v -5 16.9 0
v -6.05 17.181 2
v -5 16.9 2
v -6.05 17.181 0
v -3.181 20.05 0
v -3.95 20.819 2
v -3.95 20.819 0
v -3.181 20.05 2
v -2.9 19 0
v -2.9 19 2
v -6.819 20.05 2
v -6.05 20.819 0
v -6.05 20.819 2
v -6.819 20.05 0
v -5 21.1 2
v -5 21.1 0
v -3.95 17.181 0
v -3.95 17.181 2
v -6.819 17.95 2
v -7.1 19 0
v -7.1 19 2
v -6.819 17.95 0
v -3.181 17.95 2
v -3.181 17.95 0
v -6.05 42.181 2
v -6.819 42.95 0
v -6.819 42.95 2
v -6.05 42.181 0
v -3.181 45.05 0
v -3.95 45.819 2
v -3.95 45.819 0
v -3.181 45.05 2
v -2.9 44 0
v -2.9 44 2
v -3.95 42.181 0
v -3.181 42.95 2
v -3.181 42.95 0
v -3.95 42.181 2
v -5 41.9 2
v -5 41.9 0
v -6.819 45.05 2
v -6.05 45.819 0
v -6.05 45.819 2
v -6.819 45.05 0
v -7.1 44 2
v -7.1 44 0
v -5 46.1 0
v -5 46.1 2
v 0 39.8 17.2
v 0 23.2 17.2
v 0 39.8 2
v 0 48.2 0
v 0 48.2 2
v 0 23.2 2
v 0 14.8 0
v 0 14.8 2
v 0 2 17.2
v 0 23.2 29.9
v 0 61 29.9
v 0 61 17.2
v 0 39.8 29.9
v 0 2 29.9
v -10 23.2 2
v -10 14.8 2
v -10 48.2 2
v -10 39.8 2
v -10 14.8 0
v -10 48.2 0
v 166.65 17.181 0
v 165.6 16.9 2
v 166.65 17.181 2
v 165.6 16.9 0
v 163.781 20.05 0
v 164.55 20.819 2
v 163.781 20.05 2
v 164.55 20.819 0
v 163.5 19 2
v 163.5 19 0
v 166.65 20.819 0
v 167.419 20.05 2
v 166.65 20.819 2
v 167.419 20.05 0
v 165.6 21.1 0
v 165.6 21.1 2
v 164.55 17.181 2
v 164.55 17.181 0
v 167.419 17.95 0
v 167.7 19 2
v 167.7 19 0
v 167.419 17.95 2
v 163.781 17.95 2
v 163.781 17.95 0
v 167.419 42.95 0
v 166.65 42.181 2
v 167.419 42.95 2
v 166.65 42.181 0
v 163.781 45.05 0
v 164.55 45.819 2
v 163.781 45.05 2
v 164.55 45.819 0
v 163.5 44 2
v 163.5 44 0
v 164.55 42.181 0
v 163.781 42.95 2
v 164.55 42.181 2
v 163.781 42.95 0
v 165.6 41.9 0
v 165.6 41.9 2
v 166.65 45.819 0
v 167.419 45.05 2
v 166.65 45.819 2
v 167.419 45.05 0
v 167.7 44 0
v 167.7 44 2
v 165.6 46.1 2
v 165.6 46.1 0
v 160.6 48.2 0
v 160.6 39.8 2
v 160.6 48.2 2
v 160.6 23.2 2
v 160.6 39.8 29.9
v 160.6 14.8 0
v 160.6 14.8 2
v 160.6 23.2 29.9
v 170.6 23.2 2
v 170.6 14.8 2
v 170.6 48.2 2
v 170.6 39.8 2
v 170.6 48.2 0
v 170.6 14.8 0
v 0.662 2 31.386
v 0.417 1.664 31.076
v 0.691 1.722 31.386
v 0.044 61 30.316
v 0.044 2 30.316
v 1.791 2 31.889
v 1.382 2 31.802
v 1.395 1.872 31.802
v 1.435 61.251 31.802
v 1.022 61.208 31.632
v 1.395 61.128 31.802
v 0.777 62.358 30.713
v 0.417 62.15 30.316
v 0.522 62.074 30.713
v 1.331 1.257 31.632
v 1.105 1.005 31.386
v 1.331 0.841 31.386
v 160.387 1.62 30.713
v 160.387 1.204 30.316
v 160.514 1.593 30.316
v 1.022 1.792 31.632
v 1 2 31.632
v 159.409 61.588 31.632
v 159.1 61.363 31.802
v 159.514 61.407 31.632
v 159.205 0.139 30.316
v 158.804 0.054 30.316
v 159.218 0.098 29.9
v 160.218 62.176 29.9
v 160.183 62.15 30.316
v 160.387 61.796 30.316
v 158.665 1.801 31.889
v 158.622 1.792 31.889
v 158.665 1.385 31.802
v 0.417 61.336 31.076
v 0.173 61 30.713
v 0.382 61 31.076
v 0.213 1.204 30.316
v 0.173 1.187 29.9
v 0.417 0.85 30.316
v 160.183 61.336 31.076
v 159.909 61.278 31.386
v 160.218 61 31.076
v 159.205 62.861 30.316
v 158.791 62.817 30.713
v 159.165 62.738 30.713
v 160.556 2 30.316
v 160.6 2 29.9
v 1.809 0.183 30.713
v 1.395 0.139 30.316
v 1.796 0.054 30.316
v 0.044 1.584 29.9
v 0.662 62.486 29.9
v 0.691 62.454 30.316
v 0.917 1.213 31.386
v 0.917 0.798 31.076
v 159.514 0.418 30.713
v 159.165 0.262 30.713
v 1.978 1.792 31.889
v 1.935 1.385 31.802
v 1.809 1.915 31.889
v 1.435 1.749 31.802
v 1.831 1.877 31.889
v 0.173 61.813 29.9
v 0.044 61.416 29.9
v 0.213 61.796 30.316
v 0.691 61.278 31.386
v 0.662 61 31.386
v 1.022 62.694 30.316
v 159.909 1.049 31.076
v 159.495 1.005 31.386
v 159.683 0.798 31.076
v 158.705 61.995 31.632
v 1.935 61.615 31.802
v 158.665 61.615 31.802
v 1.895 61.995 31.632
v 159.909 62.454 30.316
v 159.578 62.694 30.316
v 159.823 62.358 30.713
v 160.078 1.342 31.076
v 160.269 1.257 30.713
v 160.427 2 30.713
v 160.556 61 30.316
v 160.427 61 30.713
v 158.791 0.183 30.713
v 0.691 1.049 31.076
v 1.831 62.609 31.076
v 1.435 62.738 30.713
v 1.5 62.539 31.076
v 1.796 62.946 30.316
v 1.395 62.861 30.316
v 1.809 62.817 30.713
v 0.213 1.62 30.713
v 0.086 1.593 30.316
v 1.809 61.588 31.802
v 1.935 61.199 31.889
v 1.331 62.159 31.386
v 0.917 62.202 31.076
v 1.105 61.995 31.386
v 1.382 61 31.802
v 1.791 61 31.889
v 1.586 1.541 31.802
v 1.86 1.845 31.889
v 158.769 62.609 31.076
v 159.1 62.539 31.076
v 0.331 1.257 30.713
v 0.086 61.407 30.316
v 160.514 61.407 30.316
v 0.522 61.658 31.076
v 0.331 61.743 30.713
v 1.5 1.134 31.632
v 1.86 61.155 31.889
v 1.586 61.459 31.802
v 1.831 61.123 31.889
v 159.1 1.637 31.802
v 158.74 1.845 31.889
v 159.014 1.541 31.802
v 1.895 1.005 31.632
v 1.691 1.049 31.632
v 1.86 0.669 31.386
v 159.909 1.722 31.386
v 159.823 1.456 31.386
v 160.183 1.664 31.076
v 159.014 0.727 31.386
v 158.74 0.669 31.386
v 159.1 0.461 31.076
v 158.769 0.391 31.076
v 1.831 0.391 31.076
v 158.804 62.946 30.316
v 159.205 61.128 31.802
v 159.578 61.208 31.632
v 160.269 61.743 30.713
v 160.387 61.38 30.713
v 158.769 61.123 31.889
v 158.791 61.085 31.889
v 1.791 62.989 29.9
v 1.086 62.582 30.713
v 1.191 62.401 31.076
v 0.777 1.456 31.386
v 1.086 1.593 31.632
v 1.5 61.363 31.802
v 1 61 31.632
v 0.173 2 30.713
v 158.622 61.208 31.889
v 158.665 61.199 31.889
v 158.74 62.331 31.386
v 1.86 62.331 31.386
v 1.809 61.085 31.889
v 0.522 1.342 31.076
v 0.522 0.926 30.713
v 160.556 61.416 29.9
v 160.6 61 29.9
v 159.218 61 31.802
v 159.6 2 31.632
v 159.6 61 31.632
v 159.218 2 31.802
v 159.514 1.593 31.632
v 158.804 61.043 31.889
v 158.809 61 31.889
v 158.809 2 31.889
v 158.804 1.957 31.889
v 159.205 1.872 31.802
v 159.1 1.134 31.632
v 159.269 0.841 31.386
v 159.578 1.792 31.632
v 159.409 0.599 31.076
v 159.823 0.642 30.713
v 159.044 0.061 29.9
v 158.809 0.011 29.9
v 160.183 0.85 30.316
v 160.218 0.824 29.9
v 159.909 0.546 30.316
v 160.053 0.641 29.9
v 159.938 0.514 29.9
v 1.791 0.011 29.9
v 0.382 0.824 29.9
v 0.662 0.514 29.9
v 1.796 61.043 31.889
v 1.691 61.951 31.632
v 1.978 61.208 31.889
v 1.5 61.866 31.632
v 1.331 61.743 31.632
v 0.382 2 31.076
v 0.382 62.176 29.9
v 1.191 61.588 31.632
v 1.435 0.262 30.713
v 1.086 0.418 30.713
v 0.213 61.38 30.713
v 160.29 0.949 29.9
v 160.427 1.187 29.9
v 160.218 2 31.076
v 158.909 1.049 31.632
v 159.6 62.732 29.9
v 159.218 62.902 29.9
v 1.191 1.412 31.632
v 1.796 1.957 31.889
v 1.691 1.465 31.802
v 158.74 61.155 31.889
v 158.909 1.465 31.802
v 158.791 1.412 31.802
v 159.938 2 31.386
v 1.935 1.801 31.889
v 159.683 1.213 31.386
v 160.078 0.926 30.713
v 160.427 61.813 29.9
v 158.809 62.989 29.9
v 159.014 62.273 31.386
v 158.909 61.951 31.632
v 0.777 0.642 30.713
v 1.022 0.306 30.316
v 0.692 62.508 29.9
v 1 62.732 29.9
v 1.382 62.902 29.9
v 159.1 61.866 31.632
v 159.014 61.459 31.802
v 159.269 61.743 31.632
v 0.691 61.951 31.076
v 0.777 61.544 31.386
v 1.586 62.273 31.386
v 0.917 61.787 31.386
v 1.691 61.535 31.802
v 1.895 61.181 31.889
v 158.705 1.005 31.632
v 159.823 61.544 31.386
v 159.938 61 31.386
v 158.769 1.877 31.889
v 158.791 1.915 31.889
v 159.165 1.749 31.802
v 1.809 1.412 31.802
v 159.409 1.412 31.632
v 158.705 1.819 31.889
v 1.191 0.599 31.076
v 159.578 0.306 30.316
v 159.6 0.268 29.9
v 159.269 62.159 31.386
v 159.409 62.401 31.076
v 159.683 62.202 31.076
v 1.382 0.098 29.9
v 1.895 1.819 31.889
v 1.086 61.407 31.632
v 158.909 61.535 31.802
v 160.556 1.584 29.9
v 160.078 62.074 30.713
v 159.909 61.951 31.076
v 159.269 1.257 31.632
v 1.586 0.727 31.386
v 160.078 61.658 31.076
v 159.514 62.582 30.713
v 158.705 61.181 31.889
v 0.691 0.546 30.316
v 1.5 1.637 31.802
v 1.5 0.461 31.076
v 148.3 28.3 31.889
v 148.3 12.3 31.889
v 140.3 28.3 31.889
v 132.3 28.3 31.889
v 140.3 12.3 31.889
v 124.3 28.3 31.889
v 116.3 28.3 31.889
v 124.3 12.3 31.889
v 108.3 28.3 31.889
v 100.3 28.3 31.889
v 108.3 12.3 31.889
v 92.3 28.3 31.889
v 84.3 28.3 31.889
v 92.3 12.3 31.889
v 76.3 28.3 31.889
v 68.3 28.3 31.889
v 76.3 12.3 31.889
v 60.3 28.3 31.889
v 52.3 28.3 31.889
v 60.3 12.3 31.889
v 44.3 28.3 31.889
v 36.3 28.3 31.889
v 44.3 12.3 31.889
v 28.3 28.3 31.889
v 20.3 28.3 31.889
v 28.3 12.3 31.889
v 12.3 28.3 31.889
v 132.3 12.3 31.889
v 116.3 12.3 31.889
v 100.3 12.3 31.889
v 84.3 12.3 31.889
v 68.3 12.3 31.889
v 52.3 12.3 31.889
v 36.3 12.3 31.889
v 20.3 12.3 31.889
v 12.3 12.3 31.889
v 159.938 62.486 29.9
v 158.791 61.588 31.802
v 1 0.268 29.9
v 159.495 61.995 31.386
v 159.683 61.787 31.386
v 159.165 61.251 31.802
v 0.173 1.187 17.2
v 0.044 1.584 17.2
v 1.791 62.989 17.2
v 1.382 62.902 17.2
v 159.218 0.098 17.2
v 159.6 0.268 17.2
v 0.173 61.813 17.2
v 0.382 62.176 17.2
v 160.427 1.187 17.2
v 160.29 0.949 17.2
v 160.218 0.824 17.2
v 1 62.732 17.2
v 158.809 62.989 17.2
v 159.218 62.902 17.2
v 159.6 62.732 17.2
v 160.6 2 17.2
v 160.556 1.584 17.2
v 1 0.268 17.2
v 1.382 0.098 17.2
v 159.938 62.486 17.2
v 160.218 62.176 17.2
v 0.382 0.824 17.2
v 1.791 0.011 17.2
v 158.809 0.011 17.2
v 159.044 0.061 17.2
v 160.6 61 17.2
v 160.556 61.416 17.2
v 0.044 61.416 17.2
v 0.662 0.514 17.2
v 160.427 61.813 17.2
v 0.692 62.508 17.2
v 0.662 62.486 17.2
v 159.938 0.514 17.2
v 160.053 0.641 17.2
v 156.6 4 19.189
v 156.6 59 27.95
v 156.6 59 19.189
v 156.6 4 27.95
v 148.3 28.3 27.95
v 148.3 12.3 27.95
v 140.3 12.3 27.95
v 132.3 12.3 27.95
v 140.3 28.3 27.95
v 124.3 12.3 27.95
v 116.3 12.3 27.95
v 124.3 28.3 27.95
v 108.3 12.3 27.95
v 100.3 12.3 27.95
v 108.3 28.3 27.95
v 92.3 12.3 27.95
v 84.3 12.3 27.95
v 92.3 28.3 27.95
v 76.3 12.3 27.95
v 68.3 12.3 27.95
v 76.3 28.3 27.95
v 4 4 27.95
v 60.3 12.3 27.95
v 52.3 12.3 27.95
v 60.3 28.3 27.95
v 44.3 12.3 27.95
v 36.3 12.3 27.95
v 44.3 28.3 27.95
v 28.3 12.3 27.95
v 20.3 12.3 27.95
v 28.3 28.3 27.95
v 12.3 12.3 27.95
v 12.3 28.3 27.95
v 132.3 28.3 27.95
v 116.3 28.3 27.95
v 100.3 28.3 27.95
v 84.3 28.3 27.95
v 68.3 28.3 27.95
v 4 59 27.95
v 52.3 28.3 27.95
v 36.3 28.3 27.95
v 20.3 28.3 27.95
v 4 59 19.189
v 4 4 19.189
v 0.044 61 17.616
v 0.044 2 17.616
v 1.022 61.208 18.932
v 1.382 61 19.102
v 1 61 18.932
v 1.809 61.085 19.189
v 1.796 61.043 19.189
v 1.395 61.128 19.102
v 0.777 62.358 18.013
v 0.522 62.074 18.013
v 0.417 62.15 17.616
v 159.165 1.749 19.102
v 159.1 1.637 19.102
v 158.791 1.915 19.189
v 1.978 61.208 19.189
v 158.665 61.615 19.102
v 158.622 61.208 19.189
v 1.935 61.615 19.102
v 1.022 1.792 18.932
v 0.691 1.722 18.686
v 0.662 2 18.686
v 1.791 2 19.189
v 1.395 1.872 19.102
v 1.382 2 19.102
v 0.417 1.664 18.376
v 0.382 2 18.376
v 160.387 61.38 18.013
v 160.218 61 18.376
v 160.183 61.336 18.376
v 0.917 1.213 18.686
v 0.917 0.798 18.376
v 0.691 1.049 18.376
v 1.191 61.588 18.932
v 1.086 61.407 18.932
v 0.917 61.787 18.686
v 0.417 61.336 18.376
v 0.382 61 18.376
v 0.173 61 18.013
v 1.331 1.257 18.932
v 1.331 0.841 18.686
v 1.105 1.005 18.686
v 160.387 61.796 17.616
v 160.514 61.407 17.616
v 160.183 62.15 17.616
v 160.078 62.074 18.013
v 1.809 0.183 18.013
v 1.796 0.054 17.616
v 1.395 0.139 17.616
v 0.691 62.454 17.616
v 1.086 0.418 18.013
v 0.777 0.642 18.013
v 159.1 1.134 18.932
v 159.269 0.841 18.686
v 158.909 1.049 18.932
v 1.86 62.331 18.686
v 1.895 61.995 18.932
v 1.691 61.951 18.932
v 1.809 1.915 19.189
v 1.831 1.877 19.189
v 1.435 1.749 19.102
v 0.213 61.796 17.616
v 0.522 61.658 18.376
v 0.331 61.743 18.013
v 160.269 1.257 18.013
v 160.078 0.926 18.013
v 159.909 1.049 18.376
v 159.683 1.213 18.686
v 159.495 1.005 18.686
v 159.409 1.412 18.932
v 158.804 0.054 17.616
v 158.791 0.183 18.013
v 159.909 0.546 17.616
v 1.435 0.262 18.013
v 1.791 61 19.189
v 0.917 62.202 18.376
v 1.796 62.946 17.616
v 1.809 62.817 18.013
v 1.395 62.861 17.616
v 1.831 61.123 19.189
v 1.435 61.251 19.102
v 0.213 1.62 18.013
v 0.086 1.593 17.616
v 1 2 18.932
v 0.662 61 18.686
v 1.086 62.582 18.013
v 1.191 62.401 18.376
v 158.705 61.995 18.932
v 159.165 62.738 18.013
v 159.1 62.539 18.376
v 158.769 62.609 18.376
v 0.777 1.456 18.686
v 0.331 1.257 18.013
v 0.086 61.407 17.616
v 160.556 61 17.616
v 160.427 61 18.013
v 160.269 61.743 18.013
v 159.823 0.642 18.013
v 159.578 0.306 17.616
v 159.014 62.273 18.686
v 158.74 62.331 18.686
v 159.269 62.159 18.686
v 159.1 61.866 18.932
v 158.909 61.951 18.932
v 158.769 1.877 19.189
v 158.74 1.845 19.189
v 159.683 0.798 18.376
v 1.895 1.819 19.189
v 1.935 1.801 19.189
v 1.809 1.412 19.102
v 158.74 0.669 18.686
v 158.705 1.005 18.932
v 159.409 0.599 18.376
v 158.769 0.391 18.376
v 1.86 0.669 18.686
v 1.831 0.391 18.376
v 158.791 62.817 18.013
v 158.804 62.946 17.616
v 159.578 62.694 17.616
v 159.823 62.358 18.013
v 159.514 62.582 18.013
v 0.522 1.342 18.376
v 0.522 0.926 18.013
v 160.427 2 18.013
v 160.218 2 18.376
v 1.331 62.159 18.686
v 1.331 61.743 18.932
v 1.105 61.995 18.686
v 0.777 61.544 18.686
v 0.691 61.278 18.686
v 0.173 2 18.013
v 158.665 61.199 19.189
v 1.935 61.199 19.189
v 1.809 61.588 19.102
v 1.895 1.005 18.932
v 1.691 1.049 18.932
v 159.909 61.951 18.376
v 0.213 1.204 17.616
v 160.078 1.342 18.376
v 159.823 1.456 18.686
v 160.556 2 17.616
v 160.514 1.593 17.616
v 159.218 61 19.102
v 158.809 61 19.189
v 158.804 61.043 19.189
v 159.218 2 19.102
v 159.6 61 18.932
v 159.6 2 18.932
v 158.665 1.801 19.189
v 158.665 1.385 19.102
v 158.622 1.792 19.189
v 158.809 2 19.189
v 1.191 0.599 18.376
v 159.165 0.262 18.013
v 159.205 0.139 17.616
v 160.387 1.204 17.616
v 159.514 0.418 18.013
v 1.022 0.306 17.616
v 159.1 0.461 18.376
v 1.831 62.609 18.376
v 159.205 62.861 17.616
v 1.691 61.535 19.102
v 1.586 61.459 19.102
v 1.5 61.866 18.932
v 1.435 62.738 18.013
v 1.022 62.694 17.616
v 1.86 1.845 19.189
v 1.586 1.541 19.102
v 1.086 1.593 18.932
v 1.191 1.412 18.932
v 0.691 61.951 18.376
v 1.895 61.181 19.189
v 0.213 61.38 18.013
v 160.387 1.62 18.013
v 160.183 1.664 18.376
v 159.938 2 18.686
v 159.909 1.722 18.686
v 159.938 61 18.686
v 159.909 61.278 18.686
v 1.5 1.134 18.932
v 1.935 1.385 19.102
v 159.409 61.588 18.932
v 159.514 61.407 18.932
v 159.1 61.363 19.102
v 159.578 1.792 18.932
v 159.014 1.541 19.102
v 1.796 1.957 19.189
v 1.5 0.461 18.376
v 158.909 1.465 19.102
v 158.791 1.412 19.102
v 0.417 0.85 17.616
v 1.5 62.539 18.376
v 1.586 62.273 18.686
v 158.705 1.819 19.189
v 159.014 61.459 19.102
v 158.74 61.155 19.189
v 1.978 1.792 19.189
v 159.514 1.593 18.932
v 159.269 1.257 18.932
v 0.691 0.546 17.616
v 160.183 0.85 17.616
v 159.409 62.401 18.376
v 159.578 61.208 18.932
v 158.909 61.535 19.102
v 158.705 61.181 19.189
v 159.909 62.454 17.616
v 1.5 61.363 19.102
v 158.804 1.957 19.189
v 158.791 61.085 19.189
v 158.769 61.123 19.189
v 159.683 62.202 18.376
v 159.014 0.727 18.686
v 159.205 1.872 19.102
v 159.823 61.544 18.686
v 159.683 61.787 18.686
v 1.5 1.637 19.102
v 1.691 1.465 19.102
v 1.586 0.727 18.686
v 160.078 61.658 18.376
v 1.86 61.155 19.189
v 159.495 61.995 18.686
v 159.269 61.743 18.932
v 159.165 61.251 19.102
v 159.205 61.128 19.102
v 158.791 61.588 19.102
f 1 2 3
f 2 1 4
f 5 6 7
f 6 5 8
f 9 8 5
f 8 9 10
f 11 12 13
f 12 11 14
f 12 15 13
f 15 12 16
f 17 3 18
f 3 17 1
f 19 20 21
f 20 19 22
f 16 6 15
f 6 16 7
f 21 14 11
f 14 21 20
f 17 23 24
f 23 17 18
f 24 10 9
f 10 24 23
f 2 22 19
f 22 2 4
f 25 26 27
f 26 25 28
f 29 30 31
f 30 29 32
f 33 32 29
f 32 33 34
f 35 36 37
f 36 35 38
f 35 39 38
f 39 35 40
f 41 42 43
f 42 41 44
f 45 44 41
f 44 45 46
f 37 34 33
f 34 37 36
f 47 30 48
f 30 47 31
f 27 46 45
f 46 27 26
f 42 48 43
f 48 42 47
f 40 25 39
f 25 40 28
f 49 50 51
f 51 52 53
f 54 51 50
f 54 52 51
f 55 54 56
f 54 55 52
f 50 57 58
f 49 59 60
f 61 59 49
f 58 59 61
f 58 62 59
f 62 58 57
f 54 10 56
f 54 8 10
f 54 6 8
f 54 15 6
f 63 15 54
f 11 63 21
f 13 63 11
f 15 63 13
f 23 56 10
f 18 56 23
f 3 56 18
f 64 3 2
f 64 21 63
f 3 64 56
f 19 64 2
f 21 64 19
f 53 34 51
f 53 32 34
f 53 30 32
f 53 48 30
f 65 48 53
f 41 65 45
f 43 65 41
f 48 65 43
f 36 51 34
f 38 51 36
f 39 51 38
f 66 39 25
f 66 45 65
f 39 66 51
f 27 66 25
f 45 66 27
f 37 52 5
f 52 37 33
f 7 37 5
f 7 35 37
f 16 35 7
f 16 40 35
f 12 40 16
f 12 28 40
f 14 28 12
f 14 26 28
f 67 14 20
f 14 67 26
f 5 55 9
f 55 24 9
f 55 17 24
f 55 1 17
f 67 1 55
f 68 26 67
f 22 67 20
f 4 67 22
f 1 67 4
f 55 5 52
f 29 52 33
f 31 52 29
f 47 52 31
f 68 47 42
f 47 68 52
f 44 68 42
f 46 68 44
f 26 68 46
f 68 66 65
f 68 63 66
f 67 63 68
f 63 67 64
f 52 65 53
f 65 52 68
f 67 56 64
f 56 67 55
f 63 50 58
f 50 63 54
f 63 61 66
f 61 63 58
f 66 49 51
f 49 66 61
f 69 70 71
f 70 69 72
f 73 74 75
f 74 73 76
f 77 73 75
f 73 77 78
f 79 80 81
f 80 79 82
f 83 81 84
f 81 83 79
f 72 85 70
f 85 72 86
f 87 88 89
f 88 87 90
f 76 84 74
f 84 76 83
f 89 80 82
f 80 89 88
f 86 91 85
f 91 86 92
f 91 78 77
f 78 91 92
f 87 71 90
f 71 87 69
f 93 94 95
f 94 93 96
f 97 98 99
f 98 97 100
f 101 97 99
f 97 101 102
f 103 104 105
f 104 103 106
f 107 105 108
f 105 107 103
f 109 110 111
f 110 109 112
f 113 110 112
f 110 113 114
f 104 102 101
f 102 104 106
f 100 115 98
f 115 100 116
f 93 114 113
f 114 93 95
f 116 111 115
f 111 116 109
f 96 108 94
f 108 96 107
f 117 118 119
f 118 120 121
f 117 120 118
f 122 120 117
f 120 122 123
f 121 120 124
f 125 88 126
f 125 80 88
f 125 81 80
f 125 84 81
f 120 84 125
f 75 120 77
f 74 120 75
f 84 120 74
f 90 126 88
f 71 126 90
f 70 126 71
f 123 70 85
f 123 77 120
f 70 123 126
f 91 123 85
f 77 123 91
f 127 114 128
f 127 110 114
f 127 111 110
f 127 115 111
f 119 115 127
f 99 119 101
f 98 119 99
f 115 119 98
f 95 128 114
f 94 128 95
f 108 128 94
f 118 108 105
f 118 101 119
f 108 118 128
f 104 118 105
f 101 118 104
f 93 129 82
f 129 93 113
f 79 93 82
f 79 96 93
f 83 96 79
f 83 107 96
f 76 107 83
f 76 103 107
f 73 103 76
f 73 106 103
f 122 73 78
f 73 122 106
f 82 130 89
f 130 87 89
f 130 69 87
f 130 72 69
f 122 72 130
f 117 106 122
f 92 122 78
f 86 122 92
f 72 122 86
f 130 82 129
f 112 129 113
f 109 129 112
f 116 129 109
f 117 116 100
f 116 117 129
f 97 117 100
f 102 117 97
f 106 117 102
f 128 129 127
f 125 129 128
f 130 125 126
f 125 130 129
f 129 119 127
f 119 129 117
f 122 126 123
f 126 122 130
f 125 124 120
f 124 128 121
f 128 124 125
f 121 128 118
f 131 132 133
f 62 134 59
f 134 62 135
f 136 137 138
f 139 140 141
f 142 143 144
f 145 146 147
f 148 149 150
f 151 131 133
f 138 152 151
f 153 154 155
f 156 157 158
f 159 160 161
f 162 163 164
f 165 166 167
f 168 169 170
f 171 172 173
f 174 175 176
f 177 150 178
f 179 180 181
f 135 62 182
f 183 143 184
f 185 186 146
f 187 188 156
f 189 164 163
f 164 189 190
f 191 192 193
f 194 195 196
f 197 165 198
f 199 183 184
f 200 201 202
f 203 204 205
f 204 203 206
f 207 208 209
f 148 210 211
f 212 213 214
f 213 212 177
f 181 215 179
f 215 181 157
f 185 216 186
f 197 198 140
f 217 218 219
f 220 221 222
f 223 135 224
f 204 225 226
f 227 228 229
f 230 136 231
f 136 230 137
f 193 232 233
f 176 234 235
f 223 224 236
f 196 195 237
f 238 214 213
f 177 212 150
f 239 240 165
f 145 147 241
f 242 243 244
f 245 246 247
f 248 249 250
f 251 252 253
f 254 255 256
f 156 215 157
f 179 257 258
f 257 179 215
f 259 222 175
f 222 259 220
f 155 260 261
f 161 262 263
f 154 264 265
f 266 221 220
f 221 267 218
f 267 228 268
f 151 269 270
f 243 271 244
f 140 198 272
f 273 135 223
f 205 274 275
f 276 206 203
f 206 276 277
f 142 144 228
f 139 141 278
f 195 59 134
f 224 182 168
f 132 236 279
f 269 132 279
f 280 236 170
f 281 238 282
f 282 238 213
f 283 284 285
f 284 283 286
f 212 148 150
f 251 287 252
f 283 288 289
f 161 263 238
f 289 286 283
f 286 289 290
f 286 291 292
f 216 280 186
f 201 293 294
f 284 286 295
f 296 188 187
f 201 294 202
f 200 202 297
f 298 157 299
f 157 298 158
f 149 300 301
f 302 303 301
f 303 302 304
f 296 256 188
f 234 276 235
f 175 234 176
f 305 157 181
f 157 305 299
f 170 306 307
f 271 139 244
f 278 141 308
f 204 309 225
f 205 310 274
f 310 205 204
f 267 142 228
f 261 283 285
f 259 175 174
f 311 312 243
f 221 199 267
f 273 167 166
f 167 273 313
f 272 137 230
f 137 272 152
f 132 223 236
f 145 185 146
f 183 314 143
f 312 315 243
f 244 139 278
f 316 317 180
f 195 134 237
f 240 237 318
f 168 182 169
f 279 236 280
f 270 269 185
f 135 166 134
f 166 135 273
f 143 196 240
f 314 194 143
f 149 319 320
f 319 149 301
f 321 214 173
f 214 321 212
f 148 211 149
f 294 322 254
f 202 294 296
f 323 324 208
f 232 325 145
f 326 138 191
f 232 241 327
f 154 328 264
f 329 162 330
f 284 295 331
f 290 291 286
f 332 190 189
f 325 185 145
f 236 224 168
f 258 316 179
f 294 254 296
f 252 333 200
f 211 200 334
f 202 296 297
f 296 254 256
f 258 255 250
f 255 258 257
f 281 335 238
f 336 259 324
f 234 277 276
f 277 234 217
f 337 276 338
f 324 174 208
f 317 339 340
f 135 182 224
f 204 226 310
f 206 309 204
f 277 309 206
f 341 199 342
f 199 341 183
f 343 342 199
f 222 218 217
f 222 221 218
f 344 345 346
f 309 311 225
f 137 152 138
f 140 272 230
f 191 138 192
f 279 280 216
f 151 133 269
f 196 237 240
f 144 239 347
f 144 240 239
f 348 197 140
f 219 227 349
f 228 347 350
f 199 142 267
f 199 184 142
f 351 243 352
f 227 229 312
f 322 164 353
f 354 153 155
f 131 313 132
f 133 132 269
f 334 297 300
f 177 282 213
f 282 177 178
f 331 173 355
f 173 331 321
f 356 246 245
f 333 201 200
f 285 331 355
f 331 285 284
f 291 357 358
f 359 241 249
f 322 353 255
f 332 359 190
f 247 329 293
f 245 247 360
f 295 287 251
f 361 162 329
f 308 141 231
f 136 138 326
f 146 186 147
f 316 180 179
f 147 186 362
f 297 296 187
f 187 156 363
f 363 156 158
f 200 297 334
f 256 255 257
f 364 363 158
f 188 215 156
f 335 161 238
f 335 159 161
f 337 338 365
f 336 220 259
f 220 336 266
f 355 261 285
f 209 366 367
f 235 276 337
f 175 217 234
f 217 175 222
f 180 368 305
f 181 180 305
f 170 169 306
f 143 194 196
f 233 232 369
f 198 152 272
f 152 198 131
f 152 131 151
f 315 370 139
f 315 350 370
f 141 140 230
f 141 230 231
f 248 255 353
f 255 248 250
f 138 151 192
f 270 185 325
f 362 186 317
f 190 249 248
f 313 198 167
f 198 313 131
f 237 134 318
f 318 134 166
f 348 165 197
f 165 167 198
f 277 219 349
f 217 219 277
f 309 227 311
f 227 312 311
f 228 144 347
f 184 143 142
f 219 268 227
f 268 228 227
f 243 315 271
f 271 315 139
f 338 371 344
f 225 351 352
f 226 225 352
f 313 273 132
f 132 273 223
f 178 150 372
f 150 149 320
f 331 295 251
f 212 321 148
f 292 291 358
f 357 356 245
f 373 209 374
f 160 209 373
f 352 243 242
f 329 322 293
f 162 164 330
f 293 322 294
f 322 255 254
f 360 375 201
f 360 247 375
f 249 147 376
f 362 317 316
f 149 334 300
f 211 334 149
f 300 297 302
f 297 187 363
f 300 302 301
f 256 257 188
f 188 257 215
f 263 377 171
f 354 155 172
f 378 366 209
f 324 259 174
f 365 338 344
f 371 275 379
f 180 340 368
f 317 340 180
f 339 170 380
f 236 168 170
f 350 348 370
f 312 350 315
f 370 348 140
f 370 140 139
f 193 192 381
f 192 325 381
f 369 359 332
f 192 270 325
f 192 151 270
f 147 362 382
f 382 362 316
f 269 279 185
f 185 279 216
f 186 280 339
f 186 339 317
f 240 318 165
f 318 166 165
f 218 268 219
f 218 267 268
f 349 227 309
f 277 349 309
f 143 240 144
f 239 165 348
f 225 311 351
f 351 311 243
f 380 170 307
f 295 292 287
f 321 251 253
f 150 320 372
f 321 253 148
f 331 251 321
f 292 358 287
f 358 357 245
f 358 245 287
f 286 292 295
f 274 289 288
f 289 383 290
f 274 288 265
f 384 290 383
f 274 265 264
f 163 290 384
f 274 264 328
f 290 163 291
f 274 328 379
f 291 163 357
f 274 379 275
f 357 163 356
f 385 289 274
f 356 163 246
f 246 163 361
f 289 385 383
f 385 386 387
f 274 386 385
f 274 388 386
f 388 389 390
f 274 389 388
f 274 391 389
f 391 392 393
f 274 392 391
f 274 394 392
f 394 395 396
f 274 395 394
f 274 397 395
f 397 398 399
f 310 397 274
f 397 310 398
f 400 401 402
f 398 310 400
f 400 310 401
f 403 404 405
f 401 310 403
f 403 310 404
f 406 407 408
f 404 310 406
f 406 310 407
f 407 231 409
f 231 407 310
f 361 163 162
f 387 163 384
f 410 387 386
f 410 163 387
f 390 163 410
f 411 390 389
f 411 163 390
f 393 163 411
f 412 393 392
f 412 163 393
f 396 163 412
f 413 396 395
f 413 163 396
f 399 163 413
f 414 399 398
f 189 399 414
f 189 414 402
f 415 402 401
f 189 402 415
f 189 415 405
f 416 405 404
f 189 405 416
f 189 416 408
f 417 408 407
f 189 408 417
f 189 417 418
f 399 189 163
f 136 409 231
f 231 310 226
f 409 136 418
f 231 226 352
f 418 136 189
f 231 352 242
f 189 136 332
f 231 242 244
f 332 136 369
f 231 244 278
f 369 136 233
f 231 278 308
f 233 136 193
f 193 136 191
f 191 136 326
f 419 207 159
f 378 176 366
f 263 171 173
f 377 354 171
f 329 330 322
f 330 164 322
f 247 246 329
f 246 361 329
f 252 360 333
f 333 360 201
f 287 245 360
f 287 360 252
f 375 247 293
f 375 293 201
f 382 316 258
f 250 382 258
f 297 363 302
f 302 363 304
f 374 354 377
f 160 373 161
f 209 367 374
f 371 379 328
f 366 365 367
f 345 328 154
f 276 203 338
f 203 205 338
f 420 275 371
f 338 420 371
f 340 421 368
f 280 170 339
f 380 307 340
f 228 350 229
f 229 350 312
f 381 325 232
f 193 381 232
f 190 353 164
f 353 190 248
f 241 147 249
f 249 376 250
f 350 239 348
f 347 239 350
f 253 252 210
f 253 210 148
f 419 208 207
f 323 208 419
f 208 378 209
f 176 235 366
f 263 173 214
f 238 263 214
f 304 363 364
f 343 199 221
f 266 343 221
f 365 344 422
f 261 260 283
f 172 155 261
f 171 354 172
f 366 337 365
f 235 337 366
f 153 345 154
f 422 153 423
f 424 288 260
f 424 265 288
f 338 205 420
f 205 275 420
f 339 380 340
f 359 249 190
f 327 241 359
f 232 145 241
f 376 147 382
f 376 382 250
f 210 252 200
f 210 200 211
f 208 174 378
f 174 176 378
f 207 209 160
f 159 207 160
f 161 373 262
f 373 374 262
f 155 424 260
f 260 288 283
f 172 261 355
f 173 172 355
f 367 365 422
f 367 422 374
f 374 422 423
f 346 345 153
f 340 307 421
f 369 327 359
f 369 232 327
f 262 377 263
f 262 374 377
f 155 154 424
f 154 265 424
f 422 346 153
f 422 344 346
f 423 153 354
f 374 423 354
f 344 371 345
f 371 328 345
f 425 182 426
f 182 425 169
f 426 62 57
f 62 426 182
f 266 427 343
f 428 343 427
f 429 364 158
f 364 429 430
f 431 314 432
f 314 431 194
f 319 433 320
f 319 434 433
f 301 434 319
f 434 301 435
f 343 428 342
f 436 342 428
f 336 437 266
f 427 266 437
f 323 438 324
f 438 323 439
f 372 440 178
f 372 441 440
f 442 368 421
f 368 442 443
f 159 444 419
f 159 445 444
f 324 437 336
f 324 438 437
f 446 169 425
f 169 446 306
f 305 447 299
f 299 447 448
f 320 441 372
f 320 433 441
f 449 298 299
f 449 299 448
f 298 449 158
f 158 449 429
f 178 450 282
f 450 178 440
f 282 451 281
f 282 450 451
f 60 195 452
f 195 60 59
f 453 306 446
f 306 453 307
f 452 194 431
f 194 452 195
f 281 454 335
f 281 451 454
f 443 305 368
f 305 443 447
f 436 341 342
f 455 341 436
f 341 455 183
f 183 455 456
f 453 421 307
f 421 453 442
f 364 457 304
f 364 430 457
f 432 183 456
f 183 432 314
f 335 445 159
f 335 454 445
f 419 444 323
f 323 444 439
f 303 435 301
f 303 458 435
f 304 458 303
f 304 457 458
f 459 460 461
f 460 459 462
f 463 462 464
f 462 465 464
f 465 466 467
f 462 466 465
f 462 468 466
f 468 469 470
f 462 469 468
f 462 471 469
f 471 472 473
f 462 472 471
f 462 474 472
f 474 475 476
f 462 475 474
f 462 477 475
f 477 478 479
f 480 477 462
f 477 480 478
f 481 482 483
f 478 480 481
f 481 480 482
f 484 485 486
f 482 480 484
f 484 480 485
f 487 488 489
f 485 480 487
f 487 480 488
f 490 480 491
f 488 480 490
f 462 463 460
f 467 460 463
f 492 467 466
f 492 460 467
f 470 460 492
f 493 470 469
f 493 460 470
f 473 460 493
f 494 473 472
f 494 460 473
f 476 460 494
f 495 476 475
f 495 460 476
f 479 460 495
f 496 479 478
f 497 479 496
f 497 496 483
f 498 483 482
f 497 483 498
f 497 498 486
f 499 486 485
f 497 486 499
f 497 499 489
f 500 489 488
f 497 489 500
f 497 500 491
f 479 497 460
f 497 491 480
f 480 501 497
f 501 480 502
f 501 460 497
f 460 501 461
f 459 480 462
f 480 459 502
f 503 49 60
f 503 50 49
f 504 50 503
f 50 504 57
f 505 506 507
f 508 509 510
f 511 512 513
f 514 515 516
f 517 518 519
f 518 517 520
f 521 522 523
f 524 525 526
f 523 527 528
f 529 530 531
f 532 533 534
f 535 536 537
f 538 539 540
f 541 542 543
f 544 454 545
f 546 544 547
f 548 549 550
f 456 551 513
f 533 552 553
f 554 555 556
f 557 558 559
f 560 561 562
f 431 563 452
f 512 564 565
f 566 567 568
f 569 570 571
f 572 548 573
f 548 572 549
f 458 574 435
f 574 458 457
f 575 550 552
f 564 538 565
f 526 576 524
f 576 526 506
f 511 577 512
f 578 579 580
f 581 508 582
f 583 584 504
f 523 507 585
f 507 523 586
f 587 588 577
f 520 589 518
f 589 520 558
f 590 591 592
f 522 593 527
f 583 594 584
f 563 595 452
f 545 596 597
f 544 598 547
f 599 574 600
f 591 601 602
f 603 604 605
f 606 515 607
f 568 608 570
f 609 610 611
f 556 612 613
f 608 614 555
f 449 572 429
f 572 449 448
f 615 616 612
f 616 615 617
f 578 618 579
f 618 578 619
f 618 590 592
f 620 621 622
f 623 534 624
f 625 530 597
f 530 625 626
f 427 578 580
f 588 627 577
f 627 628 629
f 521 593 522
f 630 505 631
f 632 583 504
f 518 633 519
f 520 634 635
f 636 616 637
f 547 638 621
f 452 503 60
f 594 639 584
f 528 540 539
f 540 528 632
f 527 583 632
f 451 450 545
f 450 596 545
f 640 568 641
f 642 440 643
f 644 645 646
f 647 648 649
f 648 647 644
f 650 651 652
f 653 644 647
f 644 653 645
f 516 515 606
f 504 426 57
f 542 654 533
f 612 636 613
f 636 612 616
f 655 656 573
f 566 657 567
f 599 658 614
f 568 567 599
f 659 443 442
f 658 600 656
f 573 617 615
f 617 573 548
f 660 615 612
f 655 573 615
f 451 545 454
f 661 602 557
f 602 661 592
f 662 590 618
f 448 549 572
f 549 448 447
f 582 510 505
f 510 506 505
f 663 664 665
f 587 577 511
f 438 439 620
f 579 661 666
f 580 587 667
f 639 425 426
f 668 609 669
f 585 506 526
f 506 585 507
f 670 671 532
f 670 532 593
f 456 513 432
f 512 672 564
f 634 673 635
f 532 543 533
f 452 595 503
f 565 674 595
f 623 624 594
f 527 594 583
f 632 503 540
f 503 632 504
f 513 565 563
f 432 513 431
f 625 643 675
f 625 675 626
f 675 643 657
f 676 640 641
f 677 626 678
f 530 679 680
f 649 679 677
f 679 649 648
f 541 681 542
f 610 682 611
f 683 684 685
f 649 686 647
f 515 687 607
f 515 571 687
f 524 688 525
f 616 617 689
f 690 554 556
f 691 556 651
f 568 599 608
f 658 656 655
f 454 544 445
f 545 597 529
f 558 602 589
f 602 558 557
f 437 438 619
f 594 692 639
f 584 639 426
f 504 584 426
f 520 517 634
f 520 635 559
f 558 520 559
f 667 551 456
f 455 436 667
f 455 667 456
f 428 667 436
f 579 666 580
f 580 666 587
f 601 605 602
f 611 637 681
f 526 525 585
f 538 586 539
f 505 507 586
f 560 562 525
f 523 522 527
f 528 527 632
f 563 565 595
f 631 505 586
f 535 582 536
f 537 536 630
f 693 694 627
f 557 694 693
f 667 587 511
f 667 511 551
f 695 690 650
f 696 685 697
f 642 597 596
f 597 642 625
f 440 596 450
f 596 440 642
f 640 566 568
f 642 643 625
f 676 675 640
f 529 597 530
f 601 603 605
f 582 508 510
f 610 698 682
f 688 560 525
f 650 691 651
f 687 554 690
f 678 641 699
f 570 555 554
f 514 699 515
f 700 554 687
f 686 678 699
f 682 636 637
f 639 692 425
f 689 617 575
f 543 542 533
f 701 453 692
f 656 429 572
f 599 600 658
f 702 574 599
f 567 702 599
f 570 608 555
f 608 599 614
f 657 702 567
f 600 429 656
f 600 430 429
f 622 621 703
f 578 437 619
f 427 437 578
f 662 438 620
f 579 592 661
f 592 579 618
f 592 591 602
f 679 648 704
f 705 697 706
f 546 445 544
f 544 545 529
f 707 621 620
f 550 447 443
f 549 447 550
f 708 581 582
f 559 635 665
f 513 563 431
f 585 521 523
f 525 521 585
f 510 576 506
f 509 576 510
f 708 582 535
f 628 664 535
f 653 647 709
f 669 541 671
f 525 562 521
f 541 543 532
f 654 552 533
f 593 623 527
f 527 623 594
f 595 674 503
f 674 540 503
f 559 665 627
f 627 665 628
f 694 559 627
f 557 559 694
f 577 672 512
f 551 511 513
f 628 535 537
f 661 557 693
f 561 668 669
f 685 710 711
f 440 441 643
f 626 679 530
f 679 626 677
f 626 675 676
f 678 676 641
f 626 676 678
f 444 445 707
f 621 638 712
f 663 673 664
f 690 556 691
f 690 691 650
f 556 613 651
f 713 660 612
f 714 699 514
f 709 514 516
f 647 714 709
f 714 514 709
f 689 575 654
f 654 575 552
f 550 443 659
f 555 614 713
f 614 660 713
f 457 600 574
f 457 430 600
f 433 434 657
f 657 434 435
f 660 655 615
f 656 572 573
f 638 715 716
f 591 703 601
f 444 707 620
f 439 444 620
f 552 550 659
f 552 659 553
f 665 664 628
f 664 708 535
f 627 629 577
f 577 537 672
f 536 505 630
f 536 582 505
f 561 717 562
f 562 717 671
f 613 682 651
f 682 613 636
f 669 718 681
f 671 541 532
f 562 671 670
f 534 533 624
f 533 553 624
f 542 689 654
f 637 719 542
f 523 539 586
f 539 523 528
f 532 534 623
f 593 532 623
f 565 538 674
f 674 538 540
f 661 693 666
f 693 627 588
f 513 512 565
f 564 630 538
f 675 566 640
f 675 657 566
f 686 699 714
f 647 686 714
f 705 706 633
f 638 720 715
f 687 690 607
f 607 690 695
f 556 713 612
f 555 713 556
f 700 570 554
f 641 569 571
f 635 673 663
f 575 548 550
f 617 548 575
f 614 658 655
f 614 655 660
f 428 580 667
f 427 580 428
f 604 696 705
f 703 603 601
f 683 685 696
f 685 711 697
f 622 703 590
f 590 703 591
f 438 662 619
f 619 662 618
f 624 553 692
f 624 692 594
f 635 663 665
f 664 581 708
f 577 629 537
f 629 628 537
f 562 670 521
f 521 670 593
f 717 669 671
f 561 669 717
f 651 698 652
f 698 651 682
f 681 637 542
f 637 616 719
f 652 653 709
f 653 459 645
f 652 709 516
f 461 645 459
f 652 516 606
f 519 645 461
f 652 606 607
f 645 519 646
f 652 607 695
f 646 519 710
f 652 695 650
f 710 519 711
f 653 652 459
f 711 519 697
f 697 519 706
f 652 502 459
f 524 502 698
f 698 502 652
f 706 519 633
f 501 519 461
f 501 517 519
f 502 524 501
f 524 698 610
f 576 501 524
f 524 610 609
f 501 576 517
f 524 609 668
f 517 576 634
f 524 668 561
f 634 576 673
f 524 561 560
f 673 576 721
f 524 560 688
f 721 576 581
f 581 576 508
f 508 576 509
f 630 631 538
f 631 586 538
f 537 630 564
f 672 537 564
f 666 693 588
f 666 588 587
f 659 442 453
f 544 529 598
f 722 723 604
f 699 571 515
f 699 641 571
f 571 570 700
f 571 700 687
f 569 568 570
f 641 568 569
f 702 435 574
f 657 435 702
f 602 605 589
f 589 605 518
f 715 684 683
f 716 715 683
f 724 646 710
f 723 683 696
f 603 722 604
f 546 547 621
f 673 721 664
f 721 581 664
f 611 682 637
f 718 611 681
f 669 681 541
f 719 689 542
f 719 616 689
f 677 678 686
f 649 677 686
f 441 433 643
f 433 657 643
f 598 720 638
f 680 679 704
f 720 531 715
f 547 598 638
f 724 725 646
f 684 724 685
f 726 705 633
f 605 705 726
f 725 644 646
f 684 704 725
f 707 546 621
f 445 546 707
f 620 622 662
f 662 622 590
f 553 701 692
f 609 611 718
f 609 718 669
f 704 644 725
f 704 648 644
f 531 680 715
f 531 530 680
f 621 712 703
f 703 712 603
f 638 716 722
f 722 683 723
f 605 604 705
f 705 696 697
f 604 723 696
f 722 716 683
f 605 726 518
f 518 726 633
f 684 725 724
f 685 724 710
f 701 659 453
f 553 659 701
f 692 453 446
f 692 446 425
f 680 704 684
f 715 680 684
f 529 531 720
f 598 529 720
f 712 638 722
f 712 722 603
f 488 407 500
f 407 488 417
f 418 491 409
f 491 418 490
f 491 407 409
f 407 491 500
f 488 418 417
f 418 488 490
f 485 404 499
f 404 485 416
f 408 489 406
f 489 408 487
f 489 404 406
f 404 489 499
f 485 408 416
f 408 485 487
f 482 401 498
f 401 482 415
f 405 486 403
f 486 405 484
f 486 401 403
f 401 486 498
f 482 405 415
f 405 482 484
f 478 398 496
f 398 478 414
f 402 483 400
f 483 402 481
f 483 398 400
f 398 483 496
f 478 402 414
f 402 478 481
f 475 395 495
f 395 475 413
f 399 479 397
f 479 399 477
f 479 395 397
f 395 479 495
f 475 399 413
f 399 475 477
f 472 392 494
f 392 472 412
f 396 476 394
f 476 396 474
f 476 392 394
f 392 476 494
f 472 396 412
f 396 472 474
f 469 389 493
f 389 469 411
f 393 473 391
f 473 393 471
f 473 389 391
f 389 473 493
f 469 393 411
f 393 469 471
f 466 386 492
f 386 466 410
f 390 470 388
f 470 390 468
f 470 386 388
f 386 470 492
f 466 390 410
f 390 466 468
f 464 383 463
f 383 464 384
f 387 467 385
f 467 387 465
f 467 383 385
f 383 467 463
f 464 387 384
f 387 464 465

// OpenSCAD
// Powerpole cover for Chunzehui F-1005

// Screw hole diameter
screwhole_d = 4.2;
// Screw hole separation (y)
screwhole_sep = 25;
// Screw support height (z)
wing_support = 2;
// Powerpole depth (y)
pp_d = 16;
// Powerpole width (x)
pp_w = 8;
// Powerpole height (z)
pp_h = 12.7;
// Powerpole position from bottom (y)
pp_y = 12.3;
// Powerpole position from left (x)
pp_x = 12.3;
// Wing width (where screws are)
wing_w = 10;
// Powerpole count
poles = 9;
// Box height (from screw wing to base)
box_h = 19.2;
// To make drawing correct, add some extra where it doesn't matter
epsilon = 0.05;
// Pole block width
all_poles_w = 136;
// Cover depth
cover_d = 63;
// Cover empty space
cover_hollowness = 9;
// Cover wall width
cover_wall = 4;
// Rounding radius
rounding_r = 2;

box_w = 2*pp_x + all_poles_w;

module pp() {
    cube([pp_w, pp_d, pp_h+epsilon]);
}

module pps() {
    pole_sep = (all_poles_w - pp_w) / (poles - 1);
    
    for(i = [0 : poles-1]) {
        translate([pole_sep*i,0,0]) pp();
    }
}

module cover() {
    r = rounding_r;
    balls = [[r,r], [box_w-r, r], [box_w-r, cover_d-r], [r, cover_d-r]];

    // Frame
    difference() {
        union() {
            // Balls
            hull() translate([0,0,pp_h-r]) for(ball_pos = balls) {
                translate(ball_pos) sphere(r, $fn = 30);
            }
            translate([0,0,-r]) linear_extrude(pp_h) hull() for(ball_pos = balls) {
                translate(ball_pos) circle(r, $fn = 30);
            }
        }
        translate([cover_wall,cover_wall,-epsilon-r]) cube([box_w - 2*cover_wall, cover_d - 2*cover_wall, pp_h-cover_wall+2*epsilon+r]);
        
        // Bottom balls
        hull() translate([0,0,-r]) for(ball_pos = balls) {
            translate(ball_pos) sphere(r, $fn = 30);
        }
    }
}

module cover_with_pps() {
    difference() {
        cover();
        translate([pp_x,pp_y,0]) pps();
    }
}

module wing() {
    wing_d = screwhole_sep + 2*screwhole_d;
    difference() {
        translate([0,0,wing_support/2]) cube([wing_w,wing_d,wing_support], center = true);
        wing_holes();
    }
    wing_slope();
}

module wing_slope() {
    extr = screwhole_sep - 2*screwhole_d;
    tot_h = box_h + pp_h - rounding_r; 
    translate([wing_w/2,-extr/2,0]) rotate([90,0,180]) linear_extrude(extr) {
        polygon([[0,wing_support], [0, tot_h], [wing_w, wing_support]]);
    }
}

module wing_holes() {
    for(y = [-screwhole_sep/2, screwhole_sep/2]) {
        translate([0,y,-epsilon]) {
            cylinder(wing_support + 2*epsilon, d=screwhole_d, $fn = 12);
        }
    }
}

module wings() {
    // Left
    translate([-wing_w/2,cover_d/2,0]) wing();
    // Right
    translate([wing_w/2 + box_w,cover_d/2,0]) mirror([1,0,0])wing();

}

module everything() {
    wings();
    translate([0,0,box_h]) cover_with_pps();
}

everything();
